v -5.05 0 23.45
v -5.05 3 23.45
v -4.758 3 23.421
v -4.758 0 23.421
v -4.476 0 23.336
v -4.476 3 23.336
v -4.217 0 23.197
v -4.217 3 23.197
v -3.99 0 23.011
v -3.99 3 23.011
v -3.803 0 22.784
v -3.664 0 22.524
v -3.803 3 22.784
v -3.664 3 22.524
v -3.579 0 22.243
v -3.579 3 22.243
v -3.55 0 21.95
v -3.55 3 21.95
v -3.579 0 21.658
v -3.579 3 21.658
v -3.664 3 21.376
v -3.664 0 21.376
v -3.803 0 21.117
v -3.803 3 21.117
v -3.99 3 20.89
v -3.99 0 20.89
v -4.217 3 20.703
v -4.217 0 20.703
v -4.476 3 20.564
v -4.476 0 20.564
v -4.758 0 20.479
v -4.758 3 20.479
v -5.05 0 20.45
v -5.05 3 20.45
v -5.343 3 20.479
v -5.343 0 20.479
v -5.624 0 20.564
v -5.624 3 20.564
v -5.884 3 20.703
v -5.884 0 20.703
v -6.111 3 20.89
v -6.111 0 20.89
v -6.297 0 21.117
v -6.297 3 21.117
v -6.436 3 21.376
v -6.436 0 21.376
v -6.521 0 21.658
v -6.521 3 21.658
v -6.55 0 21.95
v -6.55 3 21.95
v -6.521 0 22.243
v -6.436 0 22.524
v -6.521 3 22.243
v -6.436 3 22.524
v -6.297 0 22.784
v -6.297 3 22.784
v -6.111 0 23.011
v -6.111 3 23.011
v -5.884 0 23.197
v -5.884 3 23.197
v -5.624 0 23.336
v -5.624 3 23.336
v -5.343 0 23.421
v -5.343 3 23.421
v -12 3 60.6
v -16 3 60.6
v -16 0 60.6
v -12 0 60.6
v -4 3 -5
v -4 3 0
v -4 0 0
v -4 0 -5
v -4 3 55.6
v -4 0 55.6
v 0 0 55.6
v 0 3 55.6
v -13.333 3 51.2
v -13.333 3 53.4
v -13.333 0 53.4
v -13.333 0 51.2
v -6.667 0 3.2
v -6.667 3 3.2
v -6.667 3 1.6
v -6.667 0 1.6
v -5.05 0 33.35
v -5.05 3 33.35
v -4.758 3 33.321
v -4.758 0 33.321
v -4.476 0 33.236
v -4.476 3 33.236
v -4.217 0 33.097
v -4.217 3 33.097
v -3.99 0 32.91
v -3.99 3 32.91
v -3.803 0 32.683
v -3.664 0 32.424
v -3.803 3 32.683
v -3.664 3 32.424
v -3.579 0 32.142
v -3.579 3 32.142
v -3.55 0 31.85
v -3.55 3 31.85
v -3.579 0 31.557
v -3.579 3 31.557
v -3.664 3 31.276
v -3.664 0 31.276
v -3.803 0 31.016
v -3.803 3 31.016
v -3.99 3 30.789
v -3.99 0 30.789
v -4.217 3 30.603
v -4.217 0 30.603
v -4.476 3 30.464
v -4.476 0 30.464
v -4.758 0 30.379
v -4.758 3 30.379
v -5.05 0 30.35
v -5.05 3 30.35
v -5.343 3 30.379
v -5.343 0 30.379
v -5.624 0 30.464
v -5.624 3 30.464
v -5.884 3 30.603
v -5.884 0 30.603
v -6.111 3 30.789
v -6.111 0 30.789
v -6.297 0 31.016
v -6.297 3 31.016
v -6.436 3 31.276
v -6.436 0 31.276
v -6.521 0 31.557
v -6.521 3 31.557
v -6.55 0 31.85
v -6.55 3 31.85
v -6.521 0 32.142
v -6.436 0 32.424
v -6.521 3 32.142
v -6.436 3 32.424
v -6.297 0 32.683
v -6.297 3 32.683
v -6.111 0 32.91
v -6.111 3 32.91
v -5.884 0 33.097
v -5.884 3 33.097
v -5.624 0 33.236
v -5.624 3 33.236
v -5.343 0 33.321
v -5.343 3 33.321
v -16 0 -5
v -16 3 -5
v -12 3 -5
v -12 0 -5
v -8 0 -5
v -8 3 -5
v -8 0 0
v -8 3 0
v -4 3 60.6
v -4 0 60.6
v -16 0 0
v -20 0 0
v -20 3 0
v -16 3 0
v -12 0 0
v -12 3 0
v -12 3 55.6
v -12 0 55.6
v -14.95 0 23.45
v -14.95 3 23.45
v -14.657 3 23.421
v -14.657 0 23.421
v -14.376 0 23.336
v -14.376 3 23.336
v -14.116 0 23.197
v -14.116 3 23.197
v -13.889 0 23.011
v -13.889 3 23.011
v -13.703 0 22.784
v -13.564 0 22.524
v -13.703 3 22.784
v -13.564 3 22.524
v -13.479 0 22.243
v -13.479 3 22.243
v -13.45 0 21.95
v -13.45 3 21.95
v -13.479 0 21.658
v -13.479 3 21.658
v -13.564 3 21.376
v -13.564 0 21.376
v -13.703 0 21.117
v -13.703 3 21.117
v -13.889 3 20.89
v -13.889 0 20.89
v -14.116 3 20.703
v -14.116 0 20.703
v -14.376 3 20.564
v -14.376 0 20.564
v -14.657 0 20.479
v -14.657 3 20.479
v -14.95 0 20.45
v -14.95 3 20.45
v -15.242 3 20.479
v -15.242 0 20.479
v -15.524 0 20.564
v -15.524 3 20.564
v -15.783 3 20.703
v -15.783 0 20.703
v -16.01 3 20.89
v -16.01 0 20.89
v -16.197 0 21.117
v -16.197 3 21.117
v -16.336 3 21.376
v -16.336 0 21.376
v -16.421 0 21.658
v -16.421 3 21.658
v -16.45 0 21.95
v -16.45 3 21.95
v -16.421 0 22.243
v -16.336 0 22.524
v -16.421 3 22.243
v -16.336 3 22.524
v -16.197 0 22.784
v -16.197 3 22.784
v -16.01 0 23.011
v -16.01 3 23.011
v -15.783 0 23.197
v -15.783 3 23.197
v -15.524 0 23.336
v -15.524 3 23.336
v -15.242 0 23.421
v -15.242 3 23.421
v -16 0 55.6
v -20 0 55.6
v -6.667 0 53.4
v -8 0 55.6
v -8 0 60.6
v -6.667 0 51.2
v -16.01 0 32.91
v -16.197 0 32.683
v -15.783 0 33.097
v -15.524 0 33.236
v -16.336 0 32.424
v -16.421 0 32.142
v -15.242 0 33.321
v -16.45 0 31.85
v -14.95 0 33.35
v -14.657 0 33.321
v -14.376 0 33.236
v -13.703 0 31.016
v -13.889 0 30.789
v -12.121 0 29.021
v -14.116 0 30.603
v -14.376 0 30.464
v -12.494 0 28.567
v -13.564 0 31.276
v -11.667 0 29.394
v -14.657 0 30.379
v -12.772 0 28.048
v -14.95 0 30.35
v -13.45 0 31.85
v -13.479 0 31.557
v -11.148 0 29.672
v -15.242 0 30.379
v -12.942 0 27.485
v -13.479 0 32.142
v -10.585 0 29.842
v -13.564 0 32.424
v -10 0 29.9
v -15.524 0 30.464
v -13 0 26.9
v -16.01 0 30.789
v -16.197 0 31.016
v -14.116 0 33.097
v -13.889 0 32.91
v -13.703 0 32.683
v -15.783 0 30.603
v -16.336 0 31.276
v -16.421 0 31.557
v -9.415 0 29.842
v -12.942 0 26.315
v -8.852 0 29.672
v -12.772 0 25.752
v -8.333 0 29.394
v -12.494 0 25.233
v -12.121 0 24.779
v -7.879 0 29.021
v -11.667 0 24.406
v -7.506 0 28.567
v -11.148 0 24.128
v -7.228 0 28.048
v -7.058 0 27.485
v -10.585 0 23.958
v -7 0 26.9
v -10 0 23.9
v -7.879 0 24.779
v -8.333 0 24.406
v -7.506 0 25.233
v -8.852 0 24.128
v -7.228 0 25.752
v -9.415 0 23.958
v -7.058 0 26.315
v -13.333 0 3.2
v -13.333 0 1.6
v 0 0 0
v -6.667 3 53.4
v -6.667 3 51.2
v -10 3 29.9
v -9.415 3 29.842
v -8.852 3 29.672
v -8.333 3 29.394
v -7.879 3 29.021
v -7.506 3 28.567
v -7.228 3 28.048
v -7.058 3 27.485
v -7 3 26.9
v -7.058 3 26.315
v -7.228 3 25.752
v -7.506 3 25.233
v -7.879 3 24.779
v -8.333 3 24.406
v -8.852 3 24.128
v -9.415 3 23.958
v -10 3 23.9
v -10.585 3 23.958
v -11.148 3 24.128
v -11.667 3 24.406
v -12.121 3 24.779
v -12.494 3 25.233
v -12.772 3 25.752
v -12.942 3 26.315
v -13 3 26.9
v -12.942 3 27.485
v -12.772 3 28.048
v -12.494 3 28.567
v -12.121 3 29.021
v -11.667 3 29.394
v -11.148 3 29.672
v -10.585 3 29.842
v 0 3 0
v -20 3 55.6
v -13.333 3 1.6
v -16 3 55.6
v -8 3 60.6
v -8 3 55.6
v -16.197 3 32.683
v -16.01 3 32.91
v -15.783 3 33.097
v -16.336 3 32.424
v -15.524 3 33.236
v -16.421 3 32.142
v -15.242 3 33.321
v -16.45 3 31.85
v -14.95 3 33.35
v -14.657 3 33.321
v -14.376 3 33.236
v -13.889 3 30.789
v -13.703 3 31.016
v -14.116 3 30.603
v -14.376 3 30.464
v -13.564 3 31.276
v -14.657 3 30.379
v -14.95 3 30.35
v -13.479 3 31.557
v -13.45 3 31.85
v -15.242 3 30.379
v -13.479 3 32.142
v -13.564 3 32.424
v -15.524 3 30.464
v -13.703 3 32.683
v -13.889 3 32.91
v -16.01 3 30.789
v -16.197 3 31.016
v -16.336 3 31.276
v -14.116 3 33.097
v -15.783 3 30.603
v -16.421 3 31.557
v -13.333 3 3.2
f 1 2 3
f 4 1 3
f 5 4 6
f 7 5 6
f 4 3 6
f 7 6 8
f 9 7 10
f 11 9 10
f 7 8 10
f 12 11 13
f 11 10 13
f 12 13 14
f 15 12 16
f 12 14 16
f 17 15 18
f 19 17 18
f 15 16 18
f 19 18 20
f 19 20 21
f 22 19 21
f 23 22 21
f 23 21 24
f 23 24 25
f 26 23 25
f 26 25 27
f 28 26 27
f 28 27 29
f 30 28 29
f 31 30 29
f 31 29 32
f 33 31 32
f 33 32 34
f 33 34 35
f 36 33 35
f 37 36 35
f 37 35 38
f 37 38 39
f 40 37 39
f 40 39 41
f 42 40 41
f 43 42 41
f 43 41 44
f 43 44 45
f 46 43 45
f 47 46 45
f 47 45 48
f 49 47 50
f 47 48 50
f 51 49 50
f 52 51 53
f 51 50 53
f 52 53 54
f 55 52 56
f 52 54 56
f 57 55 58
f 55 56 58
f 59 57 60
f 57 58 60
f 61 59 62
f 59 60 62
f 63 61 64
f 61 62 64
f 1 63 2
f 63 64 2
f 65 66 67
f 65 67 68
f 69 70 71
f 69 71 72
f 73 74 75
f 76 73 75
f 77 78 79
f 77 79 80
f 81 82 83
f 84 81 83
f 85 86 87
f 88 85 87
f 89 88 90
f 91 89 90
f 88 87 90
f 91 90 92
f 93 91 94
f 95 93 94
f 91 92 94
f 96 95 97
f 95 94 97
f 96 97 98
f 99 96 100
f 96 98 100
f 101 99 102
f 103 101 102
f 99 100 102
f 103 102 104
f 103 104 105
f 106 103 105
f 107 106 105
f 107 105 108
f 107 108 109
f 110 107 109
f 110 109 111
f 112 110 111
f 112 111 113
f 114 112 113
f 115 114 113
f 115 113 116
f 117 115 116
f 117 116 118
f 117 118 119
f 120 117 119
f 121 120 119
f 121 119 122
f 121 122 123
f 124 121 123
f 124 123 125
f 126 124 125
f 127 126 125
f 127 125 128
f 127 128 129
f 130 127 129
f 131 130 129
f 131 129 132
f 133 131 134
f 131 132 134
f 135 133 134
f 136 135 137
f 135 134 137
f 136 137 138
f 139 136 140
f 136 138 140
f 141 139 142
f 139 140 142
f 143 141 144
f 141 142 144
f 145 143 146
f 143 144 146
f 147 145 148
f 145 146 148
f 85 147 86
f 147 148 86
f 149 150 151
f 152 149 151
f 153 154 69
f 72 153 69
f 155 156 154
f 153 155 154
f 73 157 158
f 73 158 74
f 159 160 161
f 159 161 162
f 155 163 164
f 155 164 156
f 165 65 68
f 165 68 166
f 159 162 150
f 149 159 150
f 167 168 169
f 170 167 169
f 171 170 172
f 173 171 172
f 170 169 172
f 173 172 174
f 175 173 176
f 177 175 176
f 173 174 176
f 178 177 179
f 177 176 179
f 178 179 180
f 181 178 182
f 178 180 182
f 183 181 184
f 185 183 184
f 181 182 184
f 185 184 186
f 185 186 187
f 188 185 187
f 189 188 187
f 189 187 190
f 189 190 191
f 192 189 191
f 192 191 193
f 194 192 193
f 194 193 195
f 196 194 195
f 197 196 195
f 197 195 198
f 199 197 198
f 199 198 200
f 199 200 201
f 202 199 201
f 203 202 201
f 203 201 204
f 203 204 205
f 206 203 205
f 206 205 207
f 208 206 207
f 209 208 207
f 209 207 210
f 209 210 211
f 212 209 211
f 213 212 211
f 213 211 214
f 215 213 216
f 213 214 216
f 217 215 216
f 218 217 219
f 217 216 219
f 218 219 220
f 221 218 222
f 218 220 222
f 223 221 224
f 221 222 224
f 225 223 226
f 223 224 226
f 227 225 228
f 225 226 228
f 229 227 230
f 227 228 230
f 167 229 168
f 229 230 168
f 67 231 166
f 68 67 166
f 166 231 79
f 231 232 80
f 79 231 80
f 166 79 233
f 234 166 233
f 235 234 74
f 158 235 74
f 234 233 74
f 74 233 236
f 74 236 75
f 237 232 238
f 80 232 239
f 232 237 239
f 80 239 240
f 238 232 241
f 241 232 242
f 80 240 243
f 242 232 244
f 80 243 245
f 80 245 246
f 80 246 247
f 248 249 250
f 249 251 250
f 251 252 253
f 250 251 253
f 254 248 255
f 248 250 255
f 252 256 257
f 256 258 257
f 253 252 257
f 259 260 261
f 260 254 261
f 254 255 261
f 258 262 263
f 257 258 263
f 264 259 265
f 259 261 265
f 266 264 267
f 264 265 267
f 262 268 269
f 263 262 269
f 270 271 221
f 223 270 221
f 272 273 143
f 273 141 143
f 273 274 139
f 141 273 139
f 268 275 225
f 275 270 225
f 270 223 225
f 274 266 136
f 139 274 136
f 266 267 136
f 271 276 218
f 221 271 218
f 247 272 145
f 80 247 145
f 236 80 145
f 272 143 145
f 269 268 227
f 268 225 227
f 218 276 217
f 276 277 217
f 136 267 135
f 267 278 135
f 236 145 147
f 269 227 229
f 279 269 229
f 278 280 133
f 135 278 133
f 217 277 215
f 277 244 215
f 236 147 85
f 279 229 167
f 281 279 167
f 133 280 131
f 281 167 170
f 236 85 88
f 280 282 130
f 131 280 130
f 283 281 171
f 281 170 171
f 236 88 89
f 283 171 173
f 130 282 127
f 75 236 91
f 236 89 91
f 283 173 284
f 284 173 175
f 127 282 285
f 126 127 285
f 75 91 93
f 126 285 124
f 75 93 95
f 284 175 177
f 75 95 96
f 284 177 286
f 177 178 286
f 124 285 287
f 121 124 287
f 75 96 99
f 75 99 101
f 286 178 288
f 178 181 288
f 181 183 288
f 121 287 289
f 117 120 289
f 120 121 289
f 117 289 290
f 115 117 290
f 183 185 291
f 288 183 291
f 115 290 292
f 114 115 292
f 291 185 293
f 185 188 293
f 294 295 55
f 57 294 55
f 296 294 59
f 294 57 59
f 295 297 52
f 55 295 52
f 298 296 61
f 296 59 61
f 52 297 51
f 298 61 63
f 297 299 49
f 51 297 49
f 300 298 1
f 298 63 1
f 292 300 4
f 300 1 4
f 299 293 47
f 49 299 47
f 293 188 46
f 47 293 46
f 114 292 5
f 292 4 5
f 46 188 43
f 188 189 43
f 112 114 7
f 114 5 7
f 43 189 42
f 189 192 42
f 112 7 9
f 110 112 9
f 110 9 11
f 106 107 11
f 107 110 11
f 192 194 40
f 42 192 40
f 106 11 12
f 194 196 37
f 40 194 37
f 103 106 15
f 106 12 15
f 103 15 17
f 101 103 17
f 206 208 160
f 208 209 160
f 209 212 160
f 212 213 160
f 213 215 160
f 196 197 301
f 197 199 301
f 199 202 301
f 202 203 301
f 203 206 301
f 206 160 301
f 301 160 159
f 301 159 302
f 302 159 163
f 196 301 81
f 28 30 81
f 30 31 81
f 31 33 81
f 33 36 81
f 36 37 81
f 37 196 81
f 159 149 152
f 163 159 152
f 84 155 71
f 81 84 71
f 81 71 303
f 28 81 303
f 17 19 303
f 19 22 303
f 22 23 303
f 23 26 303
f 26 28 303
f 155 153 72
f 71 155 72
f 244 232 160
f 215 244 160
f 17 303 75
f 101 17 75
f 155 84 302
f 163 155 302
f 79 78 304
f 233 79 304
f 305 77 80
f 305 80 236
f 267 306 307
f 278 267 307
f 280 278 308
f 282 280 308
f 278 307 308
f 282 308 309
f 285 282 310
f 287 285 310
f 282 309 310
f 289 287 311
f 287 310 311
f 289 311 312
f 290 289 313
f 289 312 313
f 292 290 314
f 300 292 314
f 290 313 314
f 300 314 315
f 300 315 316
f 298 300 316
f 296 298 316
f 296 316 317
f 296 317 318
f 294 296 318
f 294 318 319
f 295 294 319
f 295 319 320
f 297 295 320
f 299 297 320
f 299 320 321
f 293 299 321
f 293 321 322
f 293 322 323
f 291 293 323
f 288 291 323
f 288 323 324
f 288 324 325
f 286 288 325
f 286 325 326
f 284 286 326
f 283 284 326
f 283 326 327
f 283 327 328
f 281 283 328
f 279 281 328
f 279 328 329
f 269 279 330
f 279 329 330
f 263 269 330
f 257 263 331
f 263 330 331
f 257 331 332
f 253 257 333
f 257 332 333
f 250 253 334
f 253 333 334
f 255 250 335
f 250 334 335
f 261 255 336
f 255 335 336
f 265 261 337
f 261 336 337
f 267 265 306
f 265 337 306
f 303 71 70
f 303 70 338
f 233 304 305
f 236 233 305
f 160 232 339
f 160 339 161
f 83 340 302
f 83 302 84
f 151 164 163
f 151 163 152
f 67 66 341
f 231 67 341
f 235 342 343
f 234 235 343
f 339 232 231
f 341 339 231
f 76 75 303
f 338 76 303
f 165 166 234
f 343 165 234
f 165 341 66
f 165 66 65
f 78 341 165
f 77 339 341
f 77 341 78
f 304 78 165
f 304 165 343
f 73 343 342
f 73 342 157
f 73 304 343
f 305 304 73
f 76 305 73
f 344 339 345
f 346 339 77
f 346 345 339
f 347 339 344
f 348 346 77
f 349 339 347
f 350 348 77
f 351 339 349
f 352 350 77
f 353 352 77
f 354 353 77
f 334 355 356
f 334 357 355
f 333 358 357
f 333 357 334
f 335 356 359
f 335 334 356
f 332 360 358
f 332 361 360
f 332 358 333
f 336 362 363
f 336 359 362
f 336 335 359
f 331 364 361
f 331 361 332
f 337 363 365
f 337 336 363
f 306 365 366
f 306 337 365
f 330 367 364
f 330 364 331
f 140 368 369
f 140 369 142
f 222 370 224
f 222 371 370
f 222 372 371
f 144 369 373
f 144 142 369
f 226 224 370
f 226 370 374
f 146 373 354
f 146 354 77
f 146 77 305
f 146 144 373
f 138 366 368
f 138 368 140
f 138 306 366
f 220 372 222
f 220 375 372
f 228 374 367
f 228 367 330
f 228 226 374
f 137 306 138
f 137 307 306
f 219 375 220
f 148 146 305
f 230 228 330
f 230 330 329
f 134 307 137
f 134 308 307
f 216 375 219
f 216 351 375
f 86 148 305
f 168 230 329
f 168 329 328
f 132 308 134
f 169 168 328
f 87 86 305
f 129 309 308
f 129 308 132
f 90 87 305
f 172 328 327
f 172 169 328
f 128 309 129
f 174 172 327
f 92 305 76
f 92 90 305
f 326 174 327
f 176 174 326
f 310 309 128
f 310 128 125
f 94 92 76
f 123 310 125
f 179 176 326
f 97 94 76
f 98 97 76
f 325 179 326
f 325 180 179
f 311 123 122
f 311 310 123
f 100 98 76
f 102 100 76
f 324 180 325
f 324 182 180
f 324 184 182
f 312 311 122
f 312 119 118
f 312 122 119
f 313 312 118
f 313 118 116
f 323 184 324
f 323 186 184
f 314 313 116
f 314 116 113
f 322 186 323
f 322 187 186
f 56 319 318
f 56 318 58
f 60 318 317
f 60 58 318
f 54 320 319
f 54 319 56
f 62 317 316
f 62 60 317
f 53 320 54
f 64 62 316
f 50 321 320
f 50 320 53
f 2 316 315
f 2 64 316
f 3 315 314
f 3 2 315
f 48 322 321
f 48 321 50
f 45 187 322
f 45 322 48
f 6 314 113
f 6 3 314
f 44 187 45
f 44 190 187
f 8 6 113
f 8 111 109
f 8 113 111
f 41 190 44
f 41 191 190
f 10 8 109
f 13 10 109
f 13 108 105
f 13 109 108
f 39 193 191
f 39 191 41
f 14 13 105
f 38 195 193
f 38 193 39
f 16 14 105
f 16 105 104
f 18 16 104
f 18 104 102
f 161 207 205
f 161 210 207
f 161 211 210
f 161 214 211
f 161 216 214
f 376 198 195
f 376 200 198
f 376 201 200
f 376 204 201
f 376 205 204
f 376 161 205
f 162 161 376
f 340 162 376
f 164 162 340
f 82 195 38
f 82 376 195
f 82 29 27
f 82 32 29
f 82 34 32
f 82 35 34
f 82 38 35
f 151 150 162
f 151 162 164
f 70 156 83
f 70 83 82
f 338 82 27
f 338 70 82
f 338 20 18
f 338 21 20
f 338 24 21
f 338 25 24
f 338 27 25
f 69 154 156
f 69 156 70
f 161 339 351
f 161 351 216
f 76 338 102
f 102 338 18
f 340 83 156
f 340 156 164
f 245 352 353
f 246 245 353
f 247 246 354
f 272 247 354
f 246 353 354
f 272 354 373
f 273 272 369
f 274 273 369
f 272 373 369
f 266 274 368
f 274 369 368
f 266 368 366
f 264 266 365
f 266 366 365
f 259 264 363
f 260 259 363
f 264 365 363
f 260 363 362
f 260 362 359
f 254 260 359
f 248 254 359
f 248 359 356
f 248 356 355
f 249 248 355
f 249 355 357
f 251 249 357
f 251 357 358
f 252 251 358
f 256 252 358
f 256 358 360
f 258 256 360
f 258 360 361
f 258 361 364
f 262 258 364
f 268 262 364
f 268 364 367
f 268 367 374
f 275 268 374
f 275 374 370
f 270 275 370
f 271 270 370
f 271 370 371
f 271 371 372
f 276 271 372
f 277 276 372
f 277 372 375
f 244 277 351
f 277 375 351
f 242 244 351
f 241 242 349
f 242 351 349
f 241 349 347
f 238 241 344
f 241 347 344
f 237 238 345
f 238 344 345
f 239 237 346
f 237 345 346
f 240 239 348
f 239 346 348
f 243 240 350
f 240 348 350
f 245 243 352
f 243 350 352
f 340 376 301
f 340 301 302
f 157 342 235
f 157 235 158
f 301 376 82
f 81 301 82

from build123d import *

# Parameters (mm, degrees)
SKETCH_1_W          = 20
SKETCH_1_H          = 55.6
EXTRUDE_1_DEPTH     = 3
SKETCH_2_W          = 4
SKETCH_2_H          = 5
EXTRUDE_2_DEPTH     = 3
SKETCH_3_W          = 6.666666666
SKETCH_3_H          = 2.2
SKETCH_3_R          = 1.5
SKETCH_3_R_2        = 3
SKETCH_3_H_2        = 1.6
CUT_EXTRUDE_1_DEPTH = 10


with BuildPart() as part:
    # 草图1 → 凸台-拉伸1 (new body)
    with BuildSketch(Plane(origin=(0, 0, 0), x_dir=(1, 0, 0), z_dir=(0, 1, 0))):
        with Locations((-10, -27.8)):
            Rectangle(SKETCH_1_W, SKETCH_1_H)
    extrude(amount=EXTRUDE_1_DEPTH)

    # 草图2 → 凸台-拉伸2 (add)
    with BuildSketch(Plane(origin=(0, 3, 0), x_dir=(1, 0, 0), z_dir=(0, 1, 0))):
        with Locations((-14, 2.5)):
            Rectangle(SKETCH_2_W, SKETCH_2_H)
        with Locations((-6, 2.5)):
            Rectangle(SKETCH_2_W, SKETCH_2_H)
        with Locations((-14, -58.1)):
            Rectangle(SKETCH_2_W, SKETCH_2_H)
        with Locations((-6, -58.1)):
            Rectangle(SKETCH_2_W, SKETCH_2_H)
    extrude(amount=-EXTRUDE_2_DEPTH)

    # 草图3 → 切除-拉伸1 (cut)
    with BuildSketch(Plane(origin=(0, 3, 0), x_dir=(1, 0, 0), z_dir=(0, 1, 0))):
        with Locations((-10, -52.3)):
            Rectangle(SKETCH_3_W, SKETCH_3_H)
        with Locations(Location((-5.050252532, -31.849747468, 0), (0, 0, 270))):
            Circle(SKETCH_3_R)
        with Locations(Location((-10, -26.9, 0), (0, 0, 270))):
            Circle(SKETCH_3_R_2)
        with Locations((-10, -2.4)):
            Rectangle(SKETCH_3_W, SKETCH_3_H_2)
        with Locations(Location((-14.949747468, -31.849747468, 0), (0, 0, 270))):
            Circle(SKETCH_3_R)
        with Locations(Location((-14.949747468, -21.950252532, 0), (0, 0, 270))):
            Circle(SKETCH_3_R)
        with Locations(Location((-5.050252532, -21.950252532, 0), (0, 0, 270))):
            Circle(SKETCH_3_R)
    extrude(amount=-CUT_EXTRUDE_1_DEPTH, mode=Mode.SUBTRACT)


solid = part.part
